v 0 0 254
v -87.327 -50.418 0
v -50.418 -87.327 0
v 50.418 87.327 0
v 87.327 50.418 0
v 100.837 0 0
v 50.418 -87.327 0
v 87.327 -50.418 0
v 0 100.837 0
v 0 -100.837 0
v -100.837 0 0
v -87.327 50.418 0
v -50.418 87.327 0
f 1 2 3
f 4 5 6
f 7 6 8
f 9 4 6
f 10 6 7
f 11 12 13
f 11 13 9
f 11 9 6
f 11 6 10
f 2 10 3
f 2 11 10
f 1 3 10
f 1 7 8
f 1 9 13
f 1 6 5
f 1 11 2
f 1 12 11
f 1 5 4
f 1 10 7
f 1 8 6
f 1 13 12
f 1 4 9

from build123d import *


with BuildPart() as f3:
    # F0 (on Top) → F3 section 0
    with BuildSketch(Plane.XY, mode=Mode.PRIVATE) as f3_s0:
        Polygon((50.418489, 87.327384), (0, 100.836977), (-50.418489, 87.327384), (-87.327384, 50.418489), (-100.836977, 0), (-87.327384, -50.418489), (-50.418489, -87.327384), (0, -100.836977), (50.418489, -87.327384), (87.327384, -50.418489), (100.836977, 0), (87.327384, 50.418489), align=None)
    loft([f3_s0.sketch, Vertex(0, 0, 254)])


solid = f3.part
